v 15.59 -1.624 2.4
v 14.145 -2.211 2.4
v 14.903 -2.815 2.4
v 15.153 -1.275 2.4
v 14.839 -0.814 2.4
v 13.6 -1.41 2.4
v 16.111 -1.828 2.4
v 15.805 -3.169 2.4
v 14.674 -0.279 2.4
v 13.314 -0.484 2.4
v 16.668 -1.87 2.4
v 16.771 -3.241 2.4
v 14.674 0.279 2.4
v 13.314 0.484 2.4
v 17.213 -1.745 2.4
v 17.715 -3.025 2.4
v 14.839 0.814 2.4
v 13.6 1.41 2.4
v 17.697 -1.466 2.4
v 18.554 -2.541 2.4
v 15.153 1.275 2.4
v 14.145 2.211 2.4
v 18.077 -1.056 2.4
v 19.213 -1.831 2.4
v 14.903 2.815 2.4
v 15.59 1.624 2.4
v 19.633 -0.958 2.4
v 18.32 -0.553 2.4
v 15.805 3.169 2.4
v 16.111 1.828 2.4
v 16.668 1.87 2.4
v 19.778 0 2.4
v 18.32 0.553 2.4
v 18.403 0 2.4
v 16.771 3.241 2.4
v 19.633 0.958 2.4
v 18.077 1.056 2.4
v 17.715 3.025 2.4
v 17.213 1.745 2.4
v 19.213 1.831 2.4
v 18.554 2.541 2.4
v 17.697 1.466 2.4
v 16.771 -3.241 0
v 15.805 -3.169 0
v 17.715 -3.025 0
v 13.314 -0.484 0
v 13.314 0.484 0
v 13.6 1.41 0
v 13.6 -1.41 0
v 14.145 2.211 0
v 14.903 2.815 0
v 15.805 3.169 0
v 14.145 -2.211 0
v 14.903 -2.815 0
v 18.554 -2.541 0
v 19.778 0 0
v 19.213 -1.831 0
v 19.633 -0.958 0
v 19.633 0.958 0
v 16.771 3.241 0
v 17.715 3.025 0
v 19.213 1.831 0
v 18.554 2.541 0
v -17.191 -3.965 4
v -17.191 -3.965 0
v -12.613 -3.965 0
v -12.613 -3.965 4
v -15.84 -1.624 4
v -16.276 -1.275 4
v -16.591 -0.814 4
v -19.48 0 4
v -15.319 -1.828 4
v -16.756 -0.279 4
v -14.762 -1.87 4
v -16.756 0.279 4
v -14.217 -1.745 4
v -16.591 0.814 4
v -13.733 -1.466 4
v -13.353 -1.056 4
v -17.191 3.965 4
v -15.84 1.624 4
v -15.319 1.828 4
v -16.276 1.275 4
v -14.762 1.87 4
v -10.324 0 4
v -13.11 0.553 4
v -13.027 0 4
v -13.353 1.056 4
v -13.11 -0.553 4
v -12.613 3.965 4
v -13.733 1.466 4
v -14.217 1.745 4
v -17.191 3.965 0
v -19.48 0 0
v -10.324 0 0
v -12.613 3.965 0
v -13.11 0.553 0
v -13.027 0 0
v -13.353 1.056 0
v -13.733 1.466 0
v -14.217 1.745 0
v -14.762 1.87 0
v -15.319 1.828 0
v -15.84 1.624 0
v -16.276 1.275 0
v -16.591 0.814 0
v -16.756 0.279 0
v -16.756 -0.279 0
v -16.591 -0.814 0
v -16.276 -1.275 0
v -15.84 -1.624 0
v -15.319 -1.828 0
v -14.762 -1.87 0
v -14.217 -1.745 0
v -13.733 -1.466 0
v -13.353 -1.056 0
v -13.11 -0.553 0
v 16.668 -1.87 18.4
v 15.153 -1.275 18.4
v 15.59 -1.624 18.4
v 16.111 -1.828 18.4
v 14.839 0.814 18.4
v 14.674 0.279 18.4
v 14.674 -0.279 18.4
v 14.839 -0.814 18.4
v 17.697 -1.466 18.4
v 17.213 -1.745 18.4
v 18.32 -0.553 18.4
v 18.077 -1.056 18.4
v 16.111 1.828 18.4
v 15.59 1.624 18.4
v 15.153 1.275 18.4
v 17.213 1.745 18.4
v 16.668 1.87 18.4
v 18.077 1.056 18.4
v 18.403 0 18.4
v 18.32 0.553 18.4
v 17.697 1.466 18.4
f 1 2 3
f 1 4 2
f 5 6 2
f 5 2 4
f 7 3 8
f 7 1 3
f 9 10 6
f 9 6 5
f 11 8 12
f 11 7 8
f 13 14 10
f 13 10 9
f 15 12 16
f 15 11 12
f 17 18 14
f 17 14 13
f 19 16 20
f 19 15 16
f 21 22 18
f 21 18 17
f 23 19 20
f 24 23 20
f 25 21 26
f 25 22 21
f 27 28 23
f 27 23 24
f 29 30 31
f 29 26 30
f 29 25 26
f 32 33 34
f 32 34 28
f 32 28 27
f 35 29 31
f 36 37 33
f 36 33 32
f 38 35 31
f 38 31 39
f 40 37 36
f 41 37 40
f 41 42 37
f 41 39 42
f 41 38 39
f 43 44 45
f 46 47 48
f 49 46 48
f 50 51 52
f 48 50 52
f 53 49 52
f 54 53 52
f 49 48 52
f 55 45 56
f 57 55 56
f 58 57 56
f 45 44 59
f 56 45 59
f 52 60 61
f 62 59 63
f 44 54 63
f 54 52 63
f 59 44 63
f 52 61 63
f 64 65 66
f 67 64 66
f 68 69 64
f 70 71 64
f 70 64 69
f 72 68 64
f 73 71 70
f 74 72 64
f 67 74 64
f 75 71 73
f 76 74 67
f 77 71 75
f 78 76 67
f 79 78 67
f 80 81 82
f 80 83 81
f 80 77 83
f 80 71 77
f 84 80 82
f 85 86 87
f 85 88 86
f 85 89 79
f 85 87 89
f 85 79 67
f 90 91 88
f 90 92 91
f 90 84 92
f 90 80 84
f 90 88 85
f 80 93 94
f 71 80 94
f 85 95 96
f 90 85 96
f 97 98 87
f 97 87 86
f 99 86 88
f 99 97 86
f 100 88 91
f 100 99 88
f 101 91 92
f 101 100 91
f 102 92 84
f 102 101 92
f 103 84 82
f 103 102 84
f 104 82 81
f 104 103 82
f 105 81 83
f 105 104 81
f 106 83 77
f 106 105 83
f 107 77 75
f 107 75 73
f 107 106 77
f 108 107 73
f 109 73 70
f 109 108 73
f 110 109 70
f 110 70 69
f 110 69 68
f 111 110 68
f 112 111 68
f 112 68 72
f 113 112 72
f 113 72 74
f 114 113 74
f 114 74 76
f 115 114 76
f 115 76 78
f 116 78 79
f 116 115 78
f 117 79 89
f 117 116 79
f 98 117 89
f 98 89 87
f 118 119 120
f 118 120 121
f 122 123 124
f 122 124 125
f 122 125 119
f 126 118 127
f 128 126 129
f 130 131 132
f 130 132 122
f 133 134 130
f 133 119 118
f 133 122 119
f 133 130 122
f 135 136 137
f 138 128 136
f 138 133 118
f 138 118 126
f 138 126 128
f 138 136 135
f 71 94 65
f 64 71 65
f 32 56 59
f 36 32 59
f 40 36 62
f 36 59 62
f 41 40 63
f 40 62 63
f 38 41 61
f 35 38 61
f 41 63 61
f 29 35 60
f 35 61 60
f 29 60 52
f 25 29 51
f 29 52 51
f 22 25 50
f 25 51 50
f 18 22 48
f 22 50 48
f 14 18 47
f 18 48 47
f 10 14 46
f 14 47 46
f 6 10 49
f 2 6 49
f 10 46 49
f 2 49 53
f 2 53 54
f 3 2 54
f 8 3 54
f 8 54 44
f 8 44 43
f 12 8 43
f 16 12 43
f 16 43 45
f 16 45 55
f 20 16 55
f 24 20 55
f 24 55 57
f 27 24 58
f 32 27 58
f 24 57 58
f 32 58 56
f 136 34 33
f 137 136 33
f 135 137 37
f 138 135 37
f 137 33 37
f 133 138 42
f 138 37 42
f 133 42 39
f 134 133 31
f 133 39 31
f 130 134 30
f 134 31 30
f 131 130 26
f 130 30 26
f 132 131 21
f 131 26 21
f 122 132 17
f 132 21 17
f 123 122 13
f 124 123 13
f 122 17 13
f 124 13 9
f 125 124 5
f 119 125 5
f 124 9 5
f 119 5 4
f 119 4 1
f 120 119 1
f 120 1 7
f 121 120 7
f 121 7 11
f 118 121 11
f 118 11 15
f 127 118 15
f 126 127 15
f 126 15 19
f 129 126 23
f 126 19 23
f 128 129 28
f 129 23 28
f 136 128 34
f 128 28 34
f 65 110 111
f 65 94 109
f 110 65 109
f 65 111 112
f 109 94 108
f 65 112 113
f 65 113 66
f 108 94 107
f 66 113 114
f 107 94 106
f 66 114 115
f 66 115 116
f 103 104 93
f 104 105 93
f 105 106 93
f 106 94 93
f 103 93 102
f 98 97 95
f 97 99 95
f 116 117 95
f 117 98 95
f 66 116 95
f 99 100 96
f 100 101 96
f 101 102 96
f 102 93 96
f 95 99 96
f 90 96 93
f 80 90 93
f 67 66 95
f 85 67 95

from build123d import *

# Parameters (mm, degrees)
F0_R     = 1.875
F1_DEPTH = 4
F2_R     = 3.25
F3_DEPTH = 2.4
F4_R     = 1.875
F5_DEPTH = 16


with BuildPart() as f1:
    # F0 (on Top) → F1 (new body)
    with BuildSketch(Plane.XY):
        Polygon((-12.612818, 3.965), (-17.191206, 3.965), (-19.4804, 0), (-17.191206, -3.965), (-12.612818, -3.965), (-10.323624, 0), align=None)
        with Locations((-14.902012, 0)):
            Circle(F0_R, mode=Mode.SUBTRACT)
    extrude(amount=F1_DEPTH)


with BuildPart() as f3:
    # F2 (on Top) → F3 (new body)
    with BuildSketch(Plane.XY):
        with Locations((16.527832, 0)):
            Circle(F2_R)
    extrude(amount=F3_DEPTH)

    # F4 (on face) → F5 (join)
    with BuildSketch(Plane.XY.offset(2.4)):
        with Locations((16.527832, 0)):
            Circle(F4_R)
    extrude(amount=F5_DEPTH)


solid = Compound([f1.part, f3.part])
